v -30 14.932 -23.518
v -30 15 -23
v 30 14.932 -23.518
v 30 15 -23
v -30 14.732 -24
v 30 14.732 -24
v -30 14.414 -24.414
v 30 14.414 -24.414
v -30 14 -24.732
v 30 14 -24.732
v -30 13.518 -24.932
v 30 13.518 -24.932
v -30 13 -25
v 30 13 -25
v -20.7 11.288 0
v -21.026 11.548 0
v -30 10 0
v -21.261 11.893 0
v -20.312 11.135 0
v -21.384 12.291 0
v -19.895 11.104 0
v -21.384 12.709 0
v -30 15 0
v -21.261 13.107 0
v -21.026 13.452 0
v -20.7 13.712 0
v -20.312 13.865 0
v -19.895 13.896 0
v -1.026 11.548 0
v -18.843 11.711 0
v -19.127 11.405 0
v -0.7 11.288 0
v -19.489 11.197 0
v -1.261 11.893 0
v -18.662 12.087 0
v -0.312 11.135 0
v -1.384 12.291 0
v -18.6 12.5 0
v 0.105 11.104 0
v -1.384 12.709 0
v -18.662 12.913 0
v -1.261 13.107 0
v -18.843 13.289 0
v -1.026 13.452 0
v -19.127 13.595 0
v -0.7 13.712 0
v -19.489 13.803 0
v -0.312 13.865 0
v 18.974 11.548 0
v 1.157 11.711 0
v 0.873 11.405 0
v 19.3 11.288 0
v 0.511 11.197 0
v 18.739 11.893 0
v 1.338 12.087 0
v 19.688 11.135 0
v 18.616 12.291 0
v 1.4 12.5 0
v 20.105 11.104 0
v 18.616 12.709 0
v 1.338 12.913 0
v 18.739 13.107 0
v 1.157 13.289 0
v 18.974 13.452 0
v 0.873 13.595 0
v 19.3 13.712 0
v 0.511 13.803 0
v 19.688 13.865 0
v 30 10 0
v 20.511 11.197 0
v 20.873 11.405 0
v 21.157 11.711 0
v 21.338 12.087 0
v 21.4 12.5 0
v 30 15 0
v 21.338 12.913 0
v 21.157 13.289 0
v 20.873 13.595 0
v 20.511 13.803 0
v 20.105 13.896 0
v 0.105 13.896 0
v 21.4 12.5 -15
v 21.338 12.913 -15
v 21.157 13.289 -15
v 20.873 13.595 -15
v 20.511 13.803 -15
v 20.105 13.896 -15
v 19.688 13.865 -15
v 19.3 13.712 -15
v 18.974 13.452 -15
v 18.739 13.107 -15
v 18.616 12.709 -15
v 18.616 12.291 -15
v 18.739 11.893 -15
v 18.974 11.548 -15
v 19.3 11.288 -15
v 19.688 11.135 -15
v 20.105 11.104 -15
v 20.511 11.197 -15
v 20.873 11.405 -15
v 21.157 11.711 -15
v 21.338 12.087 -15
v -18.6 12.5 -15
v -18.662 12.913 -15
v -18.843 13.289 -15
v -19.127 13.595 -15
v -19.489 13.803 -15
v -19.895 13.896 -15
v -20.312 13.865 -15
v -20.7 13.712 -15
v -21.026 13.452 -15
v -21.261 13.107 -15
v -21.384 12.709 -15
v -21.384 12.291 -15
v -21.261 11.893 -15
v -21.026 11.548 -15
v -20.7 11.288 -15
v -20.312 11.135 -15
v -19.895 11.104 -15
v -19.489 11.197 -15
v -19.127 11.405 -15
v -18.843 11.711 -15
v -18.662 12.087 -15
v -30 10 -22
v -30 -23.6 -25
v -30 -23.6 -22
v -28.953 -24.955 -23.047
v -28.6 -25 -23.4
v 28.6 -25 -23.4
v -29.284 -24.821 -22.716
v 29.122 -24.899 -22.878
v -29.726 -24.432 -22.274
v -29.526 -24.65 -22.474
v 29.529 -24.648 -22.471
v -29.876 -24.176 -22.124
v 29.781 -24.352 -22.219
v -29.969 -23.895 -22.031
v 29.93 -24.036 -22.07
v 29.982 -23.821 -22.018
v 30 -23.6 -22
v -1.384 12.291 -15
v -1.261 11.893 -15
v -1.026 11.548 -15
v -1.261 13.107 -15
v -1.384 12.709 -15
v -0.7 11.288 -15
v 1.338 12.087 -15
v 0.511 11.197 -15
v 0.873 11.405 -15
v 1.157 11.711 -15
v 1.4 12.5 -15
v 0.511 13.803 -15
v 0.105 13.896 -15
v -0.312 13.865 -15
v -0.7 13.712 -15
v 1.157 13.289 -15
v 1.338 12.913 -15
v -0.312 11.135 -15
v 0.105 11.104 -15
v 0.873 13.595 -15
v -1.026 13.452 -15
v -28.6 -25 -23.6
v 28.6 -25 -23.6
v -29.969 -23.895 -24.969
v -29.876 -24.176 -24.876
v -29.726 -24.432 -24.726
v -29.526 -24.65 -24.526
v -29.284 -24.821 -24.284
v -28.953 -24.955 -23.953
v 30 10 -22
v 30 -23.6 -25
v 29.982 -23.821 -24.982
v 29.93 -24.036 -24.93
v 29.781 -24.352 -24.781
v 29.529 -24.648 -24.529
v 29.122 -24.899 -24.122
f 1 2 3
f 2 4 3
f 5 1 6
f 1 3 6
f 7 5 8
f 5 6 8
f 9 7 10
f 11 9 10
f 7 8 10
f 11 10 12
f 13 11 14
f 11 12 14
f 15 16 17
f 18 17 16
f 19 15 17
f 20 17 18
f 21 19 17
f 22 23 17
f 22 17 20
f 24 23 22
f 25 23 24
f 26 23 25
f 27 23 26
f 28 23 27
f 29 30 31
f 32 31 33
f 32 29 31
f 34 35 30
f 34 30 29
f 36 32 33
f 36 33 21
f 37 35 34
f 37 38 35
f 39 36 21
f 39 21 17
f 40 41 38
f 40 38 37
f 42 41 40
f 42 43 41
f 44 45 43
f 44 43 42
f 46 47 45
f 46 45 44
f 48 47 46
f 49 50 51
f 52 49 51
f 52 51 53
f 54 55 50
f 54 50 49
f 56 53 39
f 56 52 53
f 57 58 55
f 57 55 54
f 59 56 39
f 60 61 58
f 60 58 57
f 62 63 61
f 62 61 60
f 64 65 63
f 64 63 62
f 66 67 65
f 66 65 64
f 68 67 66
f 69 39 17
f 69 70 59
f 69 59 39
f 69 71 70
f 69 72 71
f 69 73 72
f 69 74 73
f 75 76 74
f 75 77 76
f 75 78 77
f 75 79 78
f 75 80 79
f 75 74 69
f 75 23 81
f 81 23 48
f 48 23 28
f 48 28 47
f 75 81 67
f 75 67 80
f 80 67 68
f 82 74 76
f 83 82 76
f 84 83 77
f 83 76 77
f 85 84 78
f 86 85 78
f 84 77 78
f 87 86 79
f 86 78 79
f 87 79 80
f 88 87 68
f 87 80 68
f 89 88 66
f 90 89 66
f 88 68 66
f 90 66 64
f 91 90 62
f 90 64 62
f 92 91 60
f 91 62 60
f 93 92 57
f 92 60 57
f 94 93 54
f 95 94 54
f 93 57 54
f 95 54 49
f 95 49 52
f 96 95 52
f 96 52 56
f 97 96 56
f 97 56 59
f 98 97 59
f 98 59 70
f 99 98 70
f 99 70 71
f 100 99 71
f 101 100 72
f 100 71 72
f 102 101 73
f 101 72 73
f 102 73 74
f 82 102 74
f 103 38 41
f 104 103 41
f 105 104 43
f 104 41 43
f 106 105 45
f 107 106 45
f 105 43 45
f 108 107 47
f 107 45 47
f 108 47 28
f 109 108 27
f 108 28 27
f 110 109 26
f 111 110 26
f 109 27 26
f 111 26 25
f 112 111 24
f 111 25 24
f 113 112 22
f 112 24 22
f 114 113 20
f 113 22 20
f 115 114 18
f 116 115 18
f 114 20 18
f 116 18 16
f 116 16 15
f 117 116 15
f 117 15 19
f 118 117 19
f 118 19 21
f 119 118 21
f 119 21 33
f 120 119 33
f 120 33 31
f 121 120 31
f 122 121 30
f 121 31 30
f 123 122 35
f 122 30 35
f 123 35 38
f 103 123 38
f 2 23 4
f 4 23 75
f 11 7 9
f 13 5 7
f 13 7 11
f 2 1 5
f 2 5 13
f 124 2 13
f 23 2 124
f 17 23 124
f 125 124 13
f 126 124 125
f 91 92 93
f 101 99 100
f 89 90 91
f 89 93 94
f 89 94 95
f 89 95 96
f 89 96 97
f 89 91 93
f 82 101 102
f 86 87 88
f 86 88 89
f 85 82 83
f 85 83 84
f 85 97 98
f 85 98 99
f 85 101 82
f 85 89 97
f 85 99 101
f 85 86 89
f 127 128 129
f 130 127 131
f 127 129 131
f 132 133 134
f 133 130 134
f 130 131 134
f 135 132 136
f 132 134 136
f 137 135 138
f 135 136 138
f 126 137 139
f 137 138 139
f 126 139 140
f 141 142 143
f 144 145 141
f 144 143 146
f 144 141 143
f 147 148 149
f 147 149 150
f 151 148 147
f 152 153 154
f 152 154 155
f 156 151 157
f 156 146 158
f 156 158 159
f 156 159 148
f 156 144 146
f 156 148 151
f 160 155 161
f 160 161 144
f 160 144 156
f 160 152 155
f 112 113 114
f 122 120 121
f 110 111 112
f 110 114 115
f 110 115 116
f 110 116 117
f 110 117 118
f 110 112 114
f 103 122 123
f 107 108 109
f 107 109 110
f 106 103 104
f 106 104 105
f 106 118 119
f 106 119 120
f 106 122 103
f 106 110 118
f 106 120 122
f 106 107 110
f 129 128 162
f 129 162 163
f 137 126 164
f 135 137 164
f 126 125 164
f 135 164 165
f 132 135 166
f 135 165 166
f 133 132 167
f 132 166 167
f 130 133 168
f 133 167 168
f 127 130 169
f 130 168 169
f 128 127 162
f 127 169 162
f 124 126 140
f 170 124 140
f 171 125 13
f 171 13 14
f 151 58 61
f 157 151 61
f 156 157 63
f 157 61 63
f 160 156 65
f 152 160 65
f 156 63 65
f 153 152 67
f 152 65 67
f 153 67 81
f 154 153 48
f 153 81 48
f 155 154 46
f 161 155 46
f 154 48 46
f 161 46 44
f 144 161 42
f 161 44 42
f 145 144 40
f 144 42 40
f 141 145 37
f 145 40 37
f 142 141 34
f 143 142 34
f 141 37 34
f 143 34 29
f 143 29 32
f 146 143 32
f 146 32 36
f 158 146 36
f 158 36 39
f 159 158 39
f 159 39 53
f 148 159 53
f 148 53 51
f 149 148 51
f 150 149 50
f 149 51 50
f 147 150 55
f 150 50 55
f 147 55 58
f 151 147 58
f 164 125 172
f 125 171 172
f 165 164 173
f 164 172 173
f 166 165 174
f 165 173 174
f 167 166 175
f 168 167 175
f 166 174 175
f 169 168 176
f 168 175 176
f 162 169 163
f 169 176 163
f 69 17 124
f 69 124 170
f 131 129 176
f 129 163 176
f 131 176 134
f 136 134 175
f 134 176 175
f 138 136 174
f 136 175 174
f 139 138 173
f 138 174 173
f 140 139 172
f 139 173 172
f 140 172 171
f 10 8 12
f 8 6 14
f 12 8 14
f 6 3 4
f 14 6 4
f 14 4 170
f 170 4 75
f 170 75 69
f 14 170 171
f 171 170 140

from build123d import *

# Parameters (mm, degrees)
SKETCH010_W     = 60
SKETCH010_H     = 5
PAD005_DEPTH    = 22
SKETCH011_W     = 60
SKETCH011_H     = 40
PAD006_DEPTH    = 3
FILLET_R        = 2
FILLET001_R     = 1.4
SKETCH012_R     = 1.4
POCKET005_DEPTH = 15


with BuildPart() as part:
    # Sketch010 → Pad005 (new body)
    with BuildSketch(Plane.XY):
        with Locations((0, 12.5)):
            Rectangle(SKETCH010_W, SKETCH010_H)
    extrude(amount=-PAD005_DEPTH)

    # Sketch011 (on Face6 of Pad005) → Pad006 (join)
    with BuildSketch(Plane(origin=(0, 0, -22), x_dir=(1, 0, 0), z_dir=(0, 0, -1))):
        with Locations((0, 5)):
            Rectangle(SKETCH011_W, SKETCH011_H)
    extrude(amount=PAD006_DEPTH)

    # Fillet
    fillet_edges = [part.edges().sort_by_distance(p)[0] for p in [
        (0, 15, -25),
    ]]
    fillet(fillet_edges, radius=FILLET_R)

    # Fillet001
    fillet001_edges = [part.edges().sort_by_distance(p)[0] for p in [
        (30, -25, -23.5),
        (-30, -25, -23.5),
        (0, -25, -22),
        (0, -25, -25),
    ]]
    fillet(fillet001_edges, radius=FILLET001_R)

    # Sketch012 (on Face14 of Fillet001) → Pocket005 (cut)
    with BuildSketch(Plane.XY):
        with Locations((-20, 12.5)):
            Circle(SKETCH012_R)
        with Locations((0, 12.5)):
            Circle(SKETCH012_R)
        with Locations((20, 12.5)):
            Circle(SKETCH012_R)
    extrude(amount=-POCKET005_DEPTH, mode=Mode.SUBTRACT)


solid = part.part
